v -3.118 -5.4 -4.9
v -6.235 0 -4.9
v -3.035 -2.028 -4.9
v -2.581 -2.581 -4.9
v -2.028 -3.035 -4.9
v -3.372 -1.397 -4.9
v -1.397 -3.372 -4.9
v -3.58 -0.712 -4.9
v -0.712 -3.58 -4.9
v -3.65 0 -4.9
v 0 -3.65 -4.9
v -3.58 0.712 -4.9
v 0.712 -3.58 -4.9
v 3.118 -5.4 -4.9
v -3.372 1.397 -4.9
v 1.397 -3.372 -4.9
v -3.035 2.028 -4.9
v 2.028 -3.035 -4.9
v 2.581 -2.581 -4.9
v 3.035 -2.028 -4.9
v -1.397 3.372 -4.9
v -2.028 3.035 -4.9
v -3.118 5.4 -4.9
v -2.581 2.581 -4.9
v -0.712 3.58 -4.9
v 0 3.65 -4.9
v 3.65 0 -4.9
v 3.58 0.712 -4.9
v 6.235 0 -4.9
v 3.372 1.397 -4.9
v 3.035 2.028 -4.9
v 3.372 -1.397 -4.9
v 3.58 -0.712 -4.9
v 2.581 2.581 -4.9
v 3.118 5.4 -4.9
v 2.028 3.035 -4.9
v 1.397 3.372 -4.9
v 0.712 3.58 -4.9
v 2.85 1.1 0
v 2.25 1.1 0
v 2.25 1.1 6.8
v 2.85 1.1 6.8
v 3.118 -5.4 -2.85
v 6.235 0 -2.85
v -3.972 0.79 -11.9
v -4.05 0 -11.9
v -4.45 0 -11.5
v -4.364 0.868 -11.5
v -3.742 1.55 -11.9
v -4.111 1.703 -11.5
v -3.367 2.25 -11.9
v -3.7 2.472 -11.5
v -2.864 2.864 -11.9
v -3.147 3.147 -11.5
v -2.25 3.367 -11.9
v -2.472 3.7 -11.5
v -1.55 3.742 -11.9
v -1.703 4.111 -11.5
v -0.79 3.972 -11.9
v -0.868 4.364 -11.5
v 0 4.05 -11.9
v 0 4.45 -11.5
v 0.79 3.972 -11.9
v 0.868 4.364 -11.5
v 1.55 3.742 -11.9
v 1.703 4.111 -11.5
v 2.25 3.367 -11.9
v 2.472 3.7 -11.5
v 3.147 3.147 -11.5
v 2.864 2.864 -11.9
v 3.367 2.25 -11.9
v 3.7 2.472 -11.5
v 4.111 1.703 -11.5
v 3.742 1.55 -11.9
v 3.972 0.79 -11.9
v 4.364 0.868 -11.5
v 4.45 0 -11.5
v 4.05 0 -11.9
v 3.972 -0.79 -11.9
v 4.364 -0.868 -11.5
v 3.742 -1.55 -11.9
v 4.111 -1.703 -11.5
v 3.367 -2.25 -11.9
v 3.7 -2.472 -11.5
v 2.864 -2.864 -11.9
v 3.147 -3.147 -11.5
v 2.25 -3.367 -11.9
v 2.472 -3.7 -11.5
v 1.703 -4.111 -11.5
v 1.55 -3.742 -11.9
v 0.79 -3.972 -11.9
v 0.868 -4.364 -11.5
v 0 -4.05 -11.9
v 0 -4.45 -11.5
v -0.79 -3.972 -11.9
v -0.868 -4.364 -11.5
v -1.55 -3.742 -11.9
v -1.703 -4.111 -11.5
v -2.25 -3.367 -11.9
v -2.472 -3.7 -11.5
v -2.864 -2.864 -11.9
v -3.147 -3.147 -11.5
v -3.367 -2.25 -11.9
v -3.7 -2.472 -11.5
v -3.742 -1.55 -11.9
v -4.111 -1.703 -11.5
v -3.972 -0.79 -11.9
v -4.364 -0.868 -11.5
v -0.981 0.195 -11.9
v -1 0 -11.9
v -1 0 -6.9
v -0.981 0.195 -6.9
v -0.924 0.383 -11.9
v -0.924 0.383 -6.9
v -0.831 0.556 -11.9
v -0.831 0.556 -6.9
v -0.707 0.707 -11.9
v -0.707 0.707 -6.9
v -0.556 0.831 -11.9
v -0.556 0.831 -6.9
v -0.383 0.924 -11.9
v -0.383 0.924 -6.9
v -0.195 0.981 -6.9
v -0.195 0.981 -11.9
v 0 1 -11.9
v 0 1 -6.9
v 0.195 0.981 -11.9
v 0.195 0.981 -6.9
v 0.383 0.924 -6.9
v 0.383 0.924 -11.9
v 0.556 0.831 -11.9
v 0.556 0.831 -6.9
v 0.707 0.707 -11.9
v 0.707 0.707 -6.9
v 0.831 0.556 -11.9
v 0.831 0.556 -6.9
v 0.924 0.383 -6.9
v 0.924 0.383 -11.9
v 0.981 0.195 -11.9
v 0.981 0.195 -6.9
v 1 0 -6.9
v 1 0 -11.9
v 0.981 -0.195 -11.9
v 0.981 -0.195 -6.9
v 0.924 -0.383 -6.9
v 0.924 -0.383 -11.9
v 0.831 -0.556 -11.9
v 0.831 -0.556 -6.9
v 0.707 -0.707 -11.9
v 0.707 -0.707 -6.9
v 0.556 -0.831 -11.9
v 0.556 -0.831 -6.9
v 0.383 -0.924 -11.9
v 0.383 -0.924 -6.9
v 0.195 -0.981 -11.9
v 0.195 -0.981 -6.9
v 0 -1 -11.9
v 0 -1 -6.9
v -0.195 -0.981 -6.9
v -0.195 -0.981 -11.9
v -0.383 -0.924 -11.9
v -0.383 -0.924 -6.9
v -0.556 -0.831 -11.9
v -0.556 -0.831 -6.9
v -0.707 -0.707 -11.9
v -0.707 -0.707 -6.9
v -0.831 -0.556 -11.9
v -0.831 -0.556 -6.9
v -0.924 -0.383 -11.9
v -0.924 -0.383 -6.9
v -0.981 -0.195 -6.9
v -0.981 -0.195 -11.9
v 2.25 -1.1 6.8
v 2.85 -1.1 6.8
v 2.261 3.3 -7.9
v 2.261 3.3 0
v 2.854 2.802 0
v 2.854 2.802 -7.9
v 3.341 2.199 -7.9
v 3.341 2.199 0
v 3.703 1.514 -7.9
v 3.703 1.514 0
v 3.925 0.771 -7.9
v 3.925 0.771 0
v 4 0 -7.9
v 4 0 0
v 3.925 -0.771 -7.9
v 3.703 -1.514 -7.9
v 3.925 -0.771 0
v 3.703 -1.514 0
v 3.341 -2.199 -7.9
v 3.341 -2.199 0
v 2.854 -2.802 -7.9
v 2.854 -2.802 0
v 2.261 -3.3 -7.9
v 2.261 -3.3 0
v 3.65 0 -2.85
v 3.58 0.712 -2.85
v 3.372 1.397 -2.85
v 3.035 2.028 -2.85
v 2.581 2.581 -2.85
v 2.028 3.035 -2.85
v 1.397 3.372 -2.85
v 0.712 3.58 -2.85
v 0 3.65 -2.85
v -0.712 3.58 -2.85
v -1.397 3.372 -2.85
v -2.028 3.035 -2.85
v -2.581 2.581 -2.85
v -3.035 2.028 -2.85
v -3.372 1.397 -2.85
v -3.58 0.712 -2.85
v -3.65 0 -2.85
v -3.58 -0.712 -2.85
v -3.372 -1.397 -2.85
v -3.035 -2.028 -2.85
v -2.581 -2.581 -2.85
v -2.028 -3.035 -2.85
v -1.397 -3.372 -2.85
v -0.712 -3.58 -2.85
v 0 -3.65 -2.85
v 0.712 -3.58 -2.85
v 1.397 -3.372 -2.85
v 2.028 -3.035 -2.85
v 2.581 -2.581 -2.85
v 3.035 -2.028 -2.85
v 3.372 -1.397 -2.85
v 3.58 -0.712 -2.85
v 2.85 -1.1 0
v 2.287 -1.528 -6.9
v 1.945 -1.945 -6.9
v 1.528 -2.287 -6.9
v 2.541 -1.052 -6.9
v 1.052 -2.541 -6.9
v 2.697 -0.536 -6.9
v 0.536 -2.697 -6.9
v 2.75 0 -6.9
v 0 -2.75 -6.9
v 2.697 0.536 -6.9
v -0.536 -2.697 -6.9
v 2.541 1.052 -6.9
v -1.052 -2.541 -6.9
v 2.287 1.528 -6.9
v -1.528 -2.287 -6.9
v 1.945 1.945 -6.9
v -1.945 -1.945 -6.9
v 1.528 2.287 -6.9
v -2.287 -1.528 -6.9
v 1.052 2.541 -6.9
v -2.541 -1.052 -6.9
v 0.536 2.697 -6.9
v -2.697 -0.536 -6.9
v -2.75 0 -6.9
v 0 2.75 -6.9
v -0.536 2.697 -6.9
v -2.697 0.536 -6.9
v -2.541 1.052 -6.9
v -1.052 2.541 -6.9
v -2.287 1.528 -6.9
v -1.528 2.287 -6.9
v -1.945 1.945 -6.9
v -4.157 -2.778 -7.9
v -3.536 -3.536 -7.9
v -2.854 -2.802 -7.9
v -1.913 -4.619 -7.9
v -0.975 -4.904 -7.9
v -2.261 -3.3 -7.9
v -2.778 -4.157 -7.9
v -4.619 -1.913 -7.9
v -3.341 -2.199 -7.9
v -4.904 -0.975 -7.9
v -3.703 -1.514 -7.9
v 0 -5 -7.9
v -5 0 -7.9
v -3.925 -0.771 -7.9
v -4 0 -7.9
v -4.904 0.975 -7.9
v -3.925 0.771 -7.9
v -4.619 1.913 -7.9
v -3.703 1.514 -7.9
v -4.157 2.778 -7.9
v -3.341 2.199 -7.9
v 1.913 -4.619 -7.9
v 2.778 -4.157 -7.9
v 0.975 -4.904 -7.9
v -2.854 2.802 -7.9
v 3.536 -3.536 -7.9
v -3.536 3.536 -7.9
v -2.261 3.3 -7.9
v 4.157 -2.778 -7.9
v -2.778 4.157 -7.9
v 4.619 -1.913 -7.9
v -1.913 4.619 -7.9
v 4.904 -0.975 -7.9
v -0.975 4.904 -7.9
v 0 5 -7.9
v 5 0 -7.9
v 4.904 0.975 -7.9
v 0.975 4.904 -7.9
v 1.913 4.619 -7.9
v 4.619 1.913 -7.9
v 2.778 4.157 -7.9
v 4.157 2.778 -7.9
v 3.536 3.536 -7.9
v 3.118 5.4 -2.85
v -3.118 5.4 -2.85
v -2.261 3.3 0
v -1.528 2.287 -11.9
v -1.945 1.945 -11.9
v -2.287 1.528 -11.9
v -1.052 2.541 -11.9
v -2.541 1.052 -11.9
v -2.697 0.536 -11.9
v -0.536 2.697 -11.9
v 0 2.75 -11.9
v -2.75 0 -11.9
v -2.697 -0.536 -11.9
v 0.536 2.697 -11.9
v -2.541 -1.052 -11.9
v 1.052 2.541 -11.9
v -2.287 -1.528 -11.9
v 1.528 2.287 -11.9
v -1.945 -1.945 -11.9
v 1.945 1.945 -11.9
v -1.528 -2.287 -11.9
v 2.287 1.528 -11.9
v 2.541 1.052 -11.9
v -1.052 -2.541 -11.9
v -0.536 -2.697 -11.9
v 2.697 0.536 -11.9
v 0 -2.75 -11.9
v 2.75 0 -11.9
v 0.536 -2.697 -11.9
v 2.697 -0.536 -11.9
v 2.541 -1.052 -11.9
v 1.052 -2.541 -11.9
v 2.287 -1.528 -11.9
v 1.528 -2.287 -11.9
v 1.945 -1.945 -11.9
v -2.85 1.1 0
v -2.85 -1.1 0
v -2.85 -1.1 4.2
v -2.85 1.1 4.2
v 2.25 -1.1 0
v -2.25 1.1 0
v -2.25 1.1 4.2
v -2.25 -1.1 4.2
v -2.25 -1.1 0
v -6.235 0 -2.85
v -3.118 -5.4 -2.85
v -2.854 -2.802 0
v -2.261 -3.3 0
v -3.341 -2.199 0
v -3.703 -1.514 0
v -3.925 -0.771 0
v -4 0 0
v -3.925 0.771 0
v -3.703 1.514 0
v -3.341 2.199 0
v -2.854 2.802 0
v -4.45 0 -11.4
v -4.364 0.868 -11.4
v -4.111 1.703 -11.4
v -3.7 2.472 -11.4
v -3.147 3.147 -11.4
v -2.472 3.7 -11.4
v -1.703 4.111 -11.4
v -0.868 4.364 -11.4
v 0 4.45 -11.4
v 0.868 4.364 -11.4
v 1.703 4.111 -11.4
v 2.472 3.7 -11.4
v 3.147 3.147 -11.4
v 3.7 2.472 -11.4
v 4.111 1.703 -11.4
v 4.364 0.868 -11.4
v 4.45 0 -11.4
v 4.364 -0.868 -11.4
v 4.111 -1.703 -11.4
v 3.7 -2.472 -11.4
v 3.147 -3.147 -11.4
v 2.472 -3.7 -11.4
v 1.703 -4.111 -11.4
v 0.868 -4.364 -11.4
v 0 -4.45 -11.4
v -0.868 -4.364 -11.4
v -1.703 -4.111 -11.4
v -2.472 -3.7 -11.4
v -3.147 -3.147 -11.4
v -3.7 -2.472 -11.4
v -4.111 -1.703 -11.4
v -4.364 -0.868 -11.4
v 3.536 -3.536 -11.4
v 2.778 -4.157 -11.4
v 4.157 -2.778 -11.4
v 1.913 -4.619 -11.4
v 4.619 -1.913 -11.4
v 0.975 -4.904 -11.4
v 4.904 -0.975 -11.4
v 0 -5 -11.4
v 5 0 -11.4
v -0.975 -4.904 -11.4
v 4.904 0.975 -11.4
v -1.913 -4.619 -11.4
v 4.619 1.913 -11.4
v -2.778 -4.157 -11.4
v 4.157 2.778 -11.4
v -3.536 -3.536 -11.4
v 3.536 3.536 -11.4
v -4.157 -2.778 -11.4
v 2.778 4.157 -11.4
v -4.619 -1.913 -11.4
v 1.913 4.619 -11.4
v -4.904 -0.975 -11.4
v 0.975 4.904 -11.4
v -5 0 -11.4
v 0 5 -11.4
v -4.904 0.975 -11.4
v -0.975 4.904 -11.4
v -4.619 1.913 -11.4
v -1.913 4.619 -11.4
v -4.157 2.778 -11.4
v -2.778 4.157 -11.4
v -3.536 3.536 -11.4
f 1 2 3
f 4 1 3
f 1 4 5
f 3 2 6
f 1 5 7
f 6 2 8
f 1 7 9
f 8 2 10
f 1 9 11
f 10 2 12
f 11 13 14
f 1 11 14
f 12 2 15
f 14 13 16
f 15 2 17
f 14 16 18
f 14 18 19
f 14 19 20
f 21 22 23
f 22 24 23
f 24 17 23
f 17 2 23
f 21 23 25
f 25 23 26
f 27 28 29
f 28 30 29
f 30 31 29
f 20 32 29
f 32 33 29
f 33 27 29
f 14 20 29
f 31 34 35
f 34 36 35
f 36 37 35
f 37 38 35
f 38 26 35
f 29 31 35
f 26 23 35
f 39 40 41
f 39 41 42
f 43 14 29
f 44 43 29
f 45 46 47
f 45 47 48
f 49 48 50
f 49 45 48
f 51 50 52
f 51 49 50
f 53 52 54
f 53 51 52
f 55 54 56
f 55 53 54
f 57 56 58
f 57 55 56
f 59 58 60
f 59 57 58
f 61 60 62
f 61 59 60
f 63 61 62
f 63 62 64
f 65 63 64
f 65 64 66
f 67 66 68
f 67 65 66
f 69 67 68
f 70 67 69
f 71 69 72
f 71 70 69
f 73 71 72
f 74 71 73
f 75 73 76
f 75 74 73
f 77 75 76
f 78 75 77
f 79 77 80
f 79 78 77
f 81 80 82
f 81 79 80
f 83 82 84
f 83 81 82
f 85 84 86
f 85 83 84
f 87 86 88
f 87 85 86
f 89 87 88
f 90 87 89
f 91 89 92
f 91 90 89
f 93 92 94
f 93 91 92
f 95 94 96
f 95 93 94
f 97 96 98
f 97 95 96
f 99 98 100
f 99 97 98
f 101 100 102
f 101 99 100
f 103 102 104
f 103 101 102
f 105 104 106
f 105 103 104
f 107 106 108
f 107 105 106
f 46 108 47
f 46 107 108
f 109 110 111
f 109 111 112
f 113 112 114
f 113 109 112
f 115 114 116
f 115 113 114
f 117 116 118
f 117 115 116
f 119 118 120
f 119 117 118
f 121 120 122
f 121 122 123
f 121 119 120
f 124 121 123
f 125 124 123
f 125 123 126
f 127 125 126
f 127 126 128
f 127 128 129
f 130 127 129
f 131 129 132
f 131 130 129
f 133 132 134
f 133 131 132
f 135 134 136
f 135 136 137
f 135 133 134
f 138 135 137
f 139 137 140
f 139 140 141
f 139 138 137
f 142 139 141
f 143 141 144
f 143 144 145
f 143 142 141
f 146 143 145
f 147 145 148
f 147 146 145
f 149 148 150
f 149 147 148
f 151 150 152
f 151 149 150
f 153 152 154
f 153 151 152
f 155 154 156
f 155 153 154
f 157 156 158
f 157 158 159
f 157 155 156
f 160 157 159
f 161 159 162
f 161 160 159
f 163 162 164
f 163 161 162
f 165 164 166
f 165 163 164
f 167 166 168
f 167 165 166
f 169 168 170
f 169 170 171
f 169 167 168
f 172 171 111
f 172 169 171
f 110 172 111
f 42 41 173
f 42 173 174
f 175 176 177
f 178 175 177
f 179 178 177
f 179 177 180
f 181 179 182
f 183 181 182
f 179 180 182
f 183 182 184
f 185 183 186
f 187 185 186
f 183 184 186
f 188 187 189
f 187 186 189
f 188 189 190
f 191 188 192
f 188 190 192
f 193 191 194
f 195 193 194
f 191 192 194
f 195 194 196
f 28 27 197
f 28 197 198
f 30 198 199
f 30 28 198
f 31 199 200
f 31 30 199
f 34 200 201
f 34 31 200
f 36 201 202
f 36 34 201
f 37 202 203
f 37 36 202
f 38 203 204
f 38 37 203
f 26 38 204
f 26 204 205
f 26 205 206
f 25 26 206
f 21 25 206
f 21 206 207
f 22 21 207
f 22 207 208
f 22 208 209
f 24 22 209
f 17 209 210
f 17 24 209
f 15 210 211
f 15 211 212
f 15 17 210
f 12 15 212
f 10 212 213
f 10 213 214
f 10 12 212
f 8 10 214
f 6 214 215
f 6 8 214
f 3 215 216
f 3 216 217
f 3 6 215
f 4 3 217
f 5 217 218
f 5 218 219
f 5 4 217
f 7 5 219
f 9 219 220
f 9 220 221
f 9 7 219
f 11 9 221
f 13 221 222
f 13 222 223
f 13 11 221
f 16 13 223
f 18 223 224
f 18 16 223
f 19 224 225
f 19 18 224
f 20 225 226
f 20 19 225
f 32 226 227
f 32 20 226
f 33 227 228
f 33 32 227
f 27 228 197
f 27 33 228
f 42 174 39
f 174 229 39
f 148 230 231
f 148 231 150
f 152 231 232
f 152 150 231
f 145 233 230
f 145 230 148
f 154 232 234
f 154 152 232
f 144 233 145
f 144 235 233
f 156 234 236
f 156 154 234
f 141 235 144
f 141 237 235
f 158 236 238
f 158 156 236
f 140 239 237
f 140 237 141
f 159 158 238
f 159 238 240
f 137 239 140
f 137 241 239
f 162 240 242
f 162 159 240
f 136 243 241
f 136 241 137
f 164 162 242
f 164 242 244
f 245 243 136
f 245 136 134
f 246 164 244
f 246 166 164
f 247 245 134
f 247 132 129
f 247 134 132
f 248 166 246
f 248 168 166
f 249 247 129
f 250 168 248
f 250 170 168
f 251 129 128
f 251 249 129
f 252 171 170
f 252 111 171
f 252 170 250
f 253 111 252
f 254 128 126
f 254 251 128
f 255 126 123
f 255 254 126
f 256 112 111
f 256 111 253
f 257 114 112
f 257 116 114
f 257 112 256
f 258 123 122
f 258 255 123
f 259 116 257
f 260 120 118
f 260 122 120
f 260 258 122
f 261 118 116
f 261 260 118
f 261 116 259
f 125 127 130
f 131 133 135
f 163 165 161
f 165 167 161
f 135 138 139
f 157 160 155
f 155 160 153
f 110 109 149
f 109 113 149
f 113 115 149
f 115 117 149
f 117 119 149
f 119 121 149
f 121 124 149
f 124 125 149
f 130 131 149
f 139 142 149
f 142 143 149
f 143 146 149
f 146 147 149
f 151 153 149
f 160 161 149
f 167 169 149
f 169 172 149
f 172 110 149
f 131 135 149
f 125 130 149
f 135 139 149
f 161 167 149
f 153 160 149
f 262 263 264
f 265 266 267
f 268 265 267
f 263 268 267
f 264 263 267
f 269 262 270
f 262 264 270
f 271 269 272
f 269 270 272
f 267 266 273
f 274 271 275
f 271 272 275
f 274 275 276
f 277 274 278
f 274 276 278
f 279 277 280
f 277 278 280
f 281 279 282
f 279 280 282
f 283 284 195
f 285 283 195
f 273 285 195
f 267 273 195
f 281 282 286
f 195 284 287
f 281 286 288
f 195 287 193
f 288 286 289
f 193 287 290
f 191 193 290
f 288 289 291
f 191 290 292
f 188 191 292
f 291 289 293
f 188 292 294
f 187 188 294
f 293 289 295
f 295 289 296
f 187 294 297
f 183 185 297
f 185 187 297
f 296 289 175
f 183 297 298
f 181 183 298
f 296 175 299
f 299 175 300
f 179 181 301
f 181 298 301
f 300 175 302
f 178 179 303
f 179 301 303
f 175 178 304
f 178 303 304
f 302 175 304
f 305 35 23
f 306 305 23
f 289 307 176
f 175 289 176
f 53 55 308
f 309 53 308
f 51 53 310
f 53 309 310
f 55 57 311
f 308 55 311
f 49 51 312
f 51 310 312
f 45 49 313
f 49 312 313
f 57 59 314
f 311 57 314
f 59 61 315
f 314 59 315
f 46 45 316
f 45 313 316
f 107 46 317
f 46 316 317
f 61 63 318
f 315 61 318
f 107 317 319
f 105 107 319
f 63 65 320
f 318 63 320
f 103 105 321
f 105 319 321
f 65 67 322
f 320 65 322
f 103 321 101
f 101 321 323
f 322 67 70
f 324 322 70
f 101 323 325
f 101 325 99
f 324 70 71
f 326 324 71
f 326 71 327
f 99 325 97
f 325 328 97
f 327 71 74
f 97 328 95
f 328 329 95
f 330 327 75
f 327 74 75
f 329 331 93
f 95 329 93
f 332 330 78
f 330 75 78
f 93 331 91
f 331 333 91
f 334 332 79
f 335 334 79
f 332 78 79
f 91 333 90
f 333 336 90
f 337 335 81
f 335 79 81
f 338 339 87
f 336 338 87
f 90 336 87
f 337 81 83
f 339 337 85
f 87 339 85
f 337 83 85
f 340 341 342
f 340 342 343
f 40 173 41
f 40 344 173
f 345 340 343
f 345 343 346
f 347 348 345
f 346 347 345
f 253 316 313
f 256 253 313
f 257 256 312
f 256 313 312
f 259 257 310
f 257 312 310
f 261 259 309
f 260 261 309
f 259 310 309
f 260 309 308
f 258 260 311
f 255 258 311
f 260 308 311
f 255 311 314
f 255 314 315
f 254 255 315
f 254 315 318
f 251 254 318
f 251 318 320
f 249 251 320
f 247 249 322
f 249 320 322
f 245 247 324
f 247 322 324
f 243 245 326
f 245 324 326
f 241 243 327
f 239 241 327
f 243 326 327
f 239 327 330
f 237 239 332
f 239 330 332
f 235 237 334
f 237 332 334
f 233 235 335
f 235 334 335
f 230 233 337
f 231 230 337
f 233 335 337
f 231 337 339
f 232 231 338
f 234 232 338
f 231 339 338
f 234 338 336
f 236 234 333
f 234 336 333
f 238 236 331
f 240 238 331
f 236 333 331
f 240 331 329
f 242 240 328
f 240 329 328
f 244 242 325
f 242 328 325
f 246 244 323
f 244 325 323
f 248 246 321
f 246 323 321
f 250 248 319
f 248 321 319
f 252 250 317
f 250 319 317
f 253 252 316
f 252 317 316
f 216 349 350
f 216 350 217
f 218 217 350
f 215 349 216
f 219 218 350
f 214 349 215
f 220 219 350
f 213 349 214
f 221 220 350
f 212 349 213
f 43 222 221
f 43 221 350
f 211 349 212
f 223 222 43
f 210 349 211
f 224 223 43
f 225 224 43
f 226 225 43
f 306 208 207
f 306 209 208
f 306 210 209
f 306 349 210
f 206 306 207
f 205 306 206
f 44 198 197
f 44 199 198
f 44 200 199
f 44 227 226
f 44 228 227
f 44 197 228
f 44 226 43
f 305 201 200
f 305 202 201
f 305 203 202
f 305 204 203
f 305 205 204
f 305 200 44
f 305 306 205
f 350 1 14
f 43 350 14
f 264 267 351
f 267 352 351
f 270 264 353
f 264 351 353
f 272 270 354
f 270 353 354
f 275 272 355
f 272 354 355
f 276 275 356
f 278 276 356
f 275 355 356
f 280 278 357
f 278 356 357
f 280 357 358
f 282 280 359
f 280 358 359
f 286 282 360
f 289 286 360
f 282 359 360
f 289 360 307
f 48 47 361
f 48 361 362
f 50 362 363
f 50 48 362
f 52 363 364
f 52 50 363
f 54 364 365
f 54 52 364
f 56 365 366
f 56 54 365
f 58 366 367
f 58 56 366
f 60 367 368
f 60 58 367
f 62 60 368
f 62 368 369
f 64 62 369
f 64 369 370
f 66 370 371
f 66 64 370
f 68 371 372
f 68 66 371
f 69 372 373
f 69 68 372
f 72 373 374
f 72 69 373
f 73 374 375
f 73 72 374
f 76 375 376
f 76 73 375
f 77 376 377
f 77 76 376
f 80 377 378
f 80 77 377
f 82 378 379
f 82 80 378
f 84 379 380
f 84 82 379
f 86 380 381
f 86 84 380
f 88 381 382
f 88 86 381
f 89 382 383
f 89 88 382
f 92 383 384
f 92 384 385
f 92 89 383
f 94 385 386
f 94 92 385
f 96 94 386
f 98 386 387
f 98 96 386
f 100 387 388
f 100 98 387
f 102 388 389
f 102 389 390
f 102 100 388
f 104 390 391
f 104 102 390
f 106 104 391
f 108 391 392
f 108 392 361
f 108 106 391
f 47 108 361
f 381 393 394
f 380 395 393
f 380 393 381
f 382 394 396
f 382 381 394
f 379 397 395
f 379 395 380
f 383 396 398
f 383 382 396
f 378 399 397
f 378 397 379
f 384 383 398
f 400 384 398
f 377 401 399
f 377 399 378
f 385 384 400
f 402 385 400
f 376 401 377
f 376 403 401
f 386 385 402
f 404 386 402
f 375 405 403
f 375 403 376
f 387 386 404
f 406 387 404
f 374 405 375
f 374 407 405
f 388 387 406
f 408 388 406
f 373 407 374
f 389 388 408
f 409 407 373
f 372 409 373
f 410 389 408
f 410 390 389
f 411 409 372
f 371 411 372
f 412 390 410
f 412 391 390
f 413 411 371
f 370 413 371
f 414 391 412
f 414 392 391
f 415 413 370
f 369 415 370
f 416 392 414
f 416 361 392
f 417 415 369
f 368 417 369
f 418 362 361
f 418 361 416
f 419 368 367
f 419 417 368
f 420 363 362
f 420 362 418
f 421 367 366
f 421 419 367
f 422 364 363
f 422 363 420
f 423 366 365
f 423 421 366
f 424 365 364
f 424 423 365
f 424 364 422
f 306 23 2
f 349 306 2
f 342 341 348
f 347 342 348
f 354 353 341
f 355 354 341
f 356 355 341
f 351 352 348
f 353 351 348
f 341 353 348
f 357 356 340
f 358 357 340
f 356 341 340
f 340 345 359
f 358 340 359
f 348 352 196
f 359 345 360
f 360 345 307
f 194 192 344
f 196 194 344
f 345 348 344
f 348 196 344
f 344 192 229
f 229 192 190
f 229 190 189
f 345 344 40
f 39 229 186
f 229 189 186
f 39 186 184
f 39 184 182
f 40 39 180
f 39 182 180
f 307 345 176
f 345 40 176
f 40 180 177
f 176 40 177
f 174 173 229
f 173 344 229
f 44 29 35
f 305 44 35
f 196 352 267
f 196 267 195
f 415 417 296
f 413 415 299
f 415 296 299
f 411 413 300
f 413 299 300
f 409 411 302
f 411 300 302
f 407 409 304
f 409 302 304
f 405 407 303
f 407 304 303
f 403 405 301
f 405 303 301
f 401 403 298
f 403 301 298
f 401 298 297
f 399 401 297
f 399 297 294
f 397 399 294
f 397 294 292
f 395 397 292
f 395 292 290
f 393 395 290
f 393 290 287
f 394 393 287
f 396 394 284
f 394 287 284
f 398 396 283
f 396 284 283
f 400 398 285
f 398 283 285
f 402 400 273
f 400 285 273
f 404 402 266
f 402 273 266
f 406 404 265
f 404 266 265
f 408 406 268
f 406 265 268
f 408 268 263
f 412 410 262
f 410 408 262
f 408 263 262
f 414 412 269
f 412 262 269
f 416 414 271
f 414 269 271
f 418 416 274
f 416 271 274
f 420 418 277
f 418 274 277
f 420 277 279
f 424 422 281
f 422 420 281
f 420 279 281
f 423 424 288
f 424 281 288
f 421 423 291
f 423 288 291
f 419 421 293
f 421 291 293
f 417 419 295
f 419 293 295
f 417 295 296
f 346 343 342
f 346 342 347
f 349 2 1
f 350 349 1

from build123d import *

# Parameters (mm, degrees)
SKETCH_4_W           = 0.6
SKETCH_4_H           = 2.2
EXTRUDE_2_DEPTH      = 4.2
SKETCH_5_W           = 0.6
SKETCH_5_H           = 2.2
EXTRUDE_3_DEPTH      = 2.6
SKETCH_7_R           = 2.75
SKETCH_7_R_2         = 1
CUT_EXTRUDE_2_DEPTH  = 5
SKETCH_8_R           = 5
SKETCH_8_R_2         = 4.45
CUT_EXTRUDE_3_DEPTH  = 0.5
CHAMFER_1_SIZE       = 0.4
SKETCH_9_OUTSIDE_W   = 16.69
SKETCH_9_OUTSIDE_H   = 16.69
SKETCH_9_OUTSIDE_W_2 = 8
SKETCH_9_OUTSIDE_H_2 = 6.6
CUT_EXTRUDE_4_DEPTH  = 7.9
EXTRUDE_START        = 3
SKETCH_10_R          = 3.65
EXTRUDE_4_DEPTH      = 2.05


with BuildPart() as part:
    # Эскиз3 → Повернуть1 (revolve)
    with BuildSketch(Plane(origin=(0, 0, 0), x_dir=(0, 0, -1), z_dir=(1, 0, 0))):
        Polygon((11.9, 0), (11.9, 5), (7.9, 5), (7.9, 4), (0, 4), (0, 0), align=None)
    revolve(axis=Axis((0, 0, 0), (0, 0, -1)))

    # Эскиз4 → Бобышка-Вытянуть2 (add)
    with BuildSketch(Plane.XY):
        with Locations((-2.55, 0)):
            Rectangle(SKETCH_4_W, SKETCH_4_H)
        with Locations((2.55, 0)):
            Rectangle(SKETCH_4_W, SKETCH_4_H)
    extrude(amount=EXTRUDE_2_DEPTH)

    # Эскиз5 → Бобышка-Вытянуть3 (add)
    with BuildSketch(Plane.XY.offset(4.2)):
        with Locations((2.55, 0)):
            Rectangle(SKETCH_5_W, SKETCH_5_H)
    extrude(amount=EXTRUDE_3_DEPTH)

    # Эскиз7 → Вырез-Вытянуть2 (cut)
    with BuildSketch(Plane(origin=(0, 0, -11.9), x_dir=(-1, 0, 0), z_dir=(0, 0, -1))):
        Circle(SKETCH_7_R)
        Circle(SKETCH_7_R_2, mode=Mode.SUBTRACT)
    extrude(amount=-CUT_EXTRUDE_2_DEPTH, mode=Mode.SUBTRACT)

    # Эскиз8 → Вырез-Вытянуть3 (cut)
    with BuildSketch(Plane(origin=(0, 0, -11.9), x_dir=(-1, 0, 0), z_dir=(0, 0, -1))):
        Circle(SKETCH_8_R)
        Circle(SKETCH_8_R_2, mode=Mode.SUBTRACT)
    extrude(amount=-CUT_EXTRUDE_3_DEPTH, mode=Mode.SUBTRACT)

    # Фаска1
    chamfer_1_edges = [part.edges().sort_by_distance(p)[0] for p in [
        (4.45, 0, -11.9),
    ]]
    chamfer(chamfer_1_edges, length=CHAMFER_1_SIZE)

    # Эскиз9 outside → Вырез-Вытянуть4 (cut)
    with BuildSketch(Plane.XY):
        Rectangle(SKETCH_9_OUTSIDE_W, SKETCH_9_OUTSIDE_H)
        Rectangle(SKETCH_9_OUTSIDE_W_2, SKETCH_9_OUTSIDE_H_2, mode=Mode.SUBTRACT)
    extrude(amount=-CUT_EXTRUDE_4_DEPTH, mode=Mode.SUBTRACT)


with BuildPart() as body_2:
    # Эскиз10 → Бобышка-Вытянуть4 (new body)
    with BuildSketch(Plane.XY.offset(-7.9).offset(EXTRUDE_START)):
        Polygon((-6.235382907, 0), (-3.117691454, -5.4), (3.117691454, -5.4), (6.235382907, 0), (3.117691454, 5.4), (-3.117691454, 5.4), align=None)
        Circle(SKETCH_10_R, mode=Mode.SUBTRACT)
    extrude(amount=EXTRUDE_4_DEPTH)


solid = Compound([part.part, body_2.part])
